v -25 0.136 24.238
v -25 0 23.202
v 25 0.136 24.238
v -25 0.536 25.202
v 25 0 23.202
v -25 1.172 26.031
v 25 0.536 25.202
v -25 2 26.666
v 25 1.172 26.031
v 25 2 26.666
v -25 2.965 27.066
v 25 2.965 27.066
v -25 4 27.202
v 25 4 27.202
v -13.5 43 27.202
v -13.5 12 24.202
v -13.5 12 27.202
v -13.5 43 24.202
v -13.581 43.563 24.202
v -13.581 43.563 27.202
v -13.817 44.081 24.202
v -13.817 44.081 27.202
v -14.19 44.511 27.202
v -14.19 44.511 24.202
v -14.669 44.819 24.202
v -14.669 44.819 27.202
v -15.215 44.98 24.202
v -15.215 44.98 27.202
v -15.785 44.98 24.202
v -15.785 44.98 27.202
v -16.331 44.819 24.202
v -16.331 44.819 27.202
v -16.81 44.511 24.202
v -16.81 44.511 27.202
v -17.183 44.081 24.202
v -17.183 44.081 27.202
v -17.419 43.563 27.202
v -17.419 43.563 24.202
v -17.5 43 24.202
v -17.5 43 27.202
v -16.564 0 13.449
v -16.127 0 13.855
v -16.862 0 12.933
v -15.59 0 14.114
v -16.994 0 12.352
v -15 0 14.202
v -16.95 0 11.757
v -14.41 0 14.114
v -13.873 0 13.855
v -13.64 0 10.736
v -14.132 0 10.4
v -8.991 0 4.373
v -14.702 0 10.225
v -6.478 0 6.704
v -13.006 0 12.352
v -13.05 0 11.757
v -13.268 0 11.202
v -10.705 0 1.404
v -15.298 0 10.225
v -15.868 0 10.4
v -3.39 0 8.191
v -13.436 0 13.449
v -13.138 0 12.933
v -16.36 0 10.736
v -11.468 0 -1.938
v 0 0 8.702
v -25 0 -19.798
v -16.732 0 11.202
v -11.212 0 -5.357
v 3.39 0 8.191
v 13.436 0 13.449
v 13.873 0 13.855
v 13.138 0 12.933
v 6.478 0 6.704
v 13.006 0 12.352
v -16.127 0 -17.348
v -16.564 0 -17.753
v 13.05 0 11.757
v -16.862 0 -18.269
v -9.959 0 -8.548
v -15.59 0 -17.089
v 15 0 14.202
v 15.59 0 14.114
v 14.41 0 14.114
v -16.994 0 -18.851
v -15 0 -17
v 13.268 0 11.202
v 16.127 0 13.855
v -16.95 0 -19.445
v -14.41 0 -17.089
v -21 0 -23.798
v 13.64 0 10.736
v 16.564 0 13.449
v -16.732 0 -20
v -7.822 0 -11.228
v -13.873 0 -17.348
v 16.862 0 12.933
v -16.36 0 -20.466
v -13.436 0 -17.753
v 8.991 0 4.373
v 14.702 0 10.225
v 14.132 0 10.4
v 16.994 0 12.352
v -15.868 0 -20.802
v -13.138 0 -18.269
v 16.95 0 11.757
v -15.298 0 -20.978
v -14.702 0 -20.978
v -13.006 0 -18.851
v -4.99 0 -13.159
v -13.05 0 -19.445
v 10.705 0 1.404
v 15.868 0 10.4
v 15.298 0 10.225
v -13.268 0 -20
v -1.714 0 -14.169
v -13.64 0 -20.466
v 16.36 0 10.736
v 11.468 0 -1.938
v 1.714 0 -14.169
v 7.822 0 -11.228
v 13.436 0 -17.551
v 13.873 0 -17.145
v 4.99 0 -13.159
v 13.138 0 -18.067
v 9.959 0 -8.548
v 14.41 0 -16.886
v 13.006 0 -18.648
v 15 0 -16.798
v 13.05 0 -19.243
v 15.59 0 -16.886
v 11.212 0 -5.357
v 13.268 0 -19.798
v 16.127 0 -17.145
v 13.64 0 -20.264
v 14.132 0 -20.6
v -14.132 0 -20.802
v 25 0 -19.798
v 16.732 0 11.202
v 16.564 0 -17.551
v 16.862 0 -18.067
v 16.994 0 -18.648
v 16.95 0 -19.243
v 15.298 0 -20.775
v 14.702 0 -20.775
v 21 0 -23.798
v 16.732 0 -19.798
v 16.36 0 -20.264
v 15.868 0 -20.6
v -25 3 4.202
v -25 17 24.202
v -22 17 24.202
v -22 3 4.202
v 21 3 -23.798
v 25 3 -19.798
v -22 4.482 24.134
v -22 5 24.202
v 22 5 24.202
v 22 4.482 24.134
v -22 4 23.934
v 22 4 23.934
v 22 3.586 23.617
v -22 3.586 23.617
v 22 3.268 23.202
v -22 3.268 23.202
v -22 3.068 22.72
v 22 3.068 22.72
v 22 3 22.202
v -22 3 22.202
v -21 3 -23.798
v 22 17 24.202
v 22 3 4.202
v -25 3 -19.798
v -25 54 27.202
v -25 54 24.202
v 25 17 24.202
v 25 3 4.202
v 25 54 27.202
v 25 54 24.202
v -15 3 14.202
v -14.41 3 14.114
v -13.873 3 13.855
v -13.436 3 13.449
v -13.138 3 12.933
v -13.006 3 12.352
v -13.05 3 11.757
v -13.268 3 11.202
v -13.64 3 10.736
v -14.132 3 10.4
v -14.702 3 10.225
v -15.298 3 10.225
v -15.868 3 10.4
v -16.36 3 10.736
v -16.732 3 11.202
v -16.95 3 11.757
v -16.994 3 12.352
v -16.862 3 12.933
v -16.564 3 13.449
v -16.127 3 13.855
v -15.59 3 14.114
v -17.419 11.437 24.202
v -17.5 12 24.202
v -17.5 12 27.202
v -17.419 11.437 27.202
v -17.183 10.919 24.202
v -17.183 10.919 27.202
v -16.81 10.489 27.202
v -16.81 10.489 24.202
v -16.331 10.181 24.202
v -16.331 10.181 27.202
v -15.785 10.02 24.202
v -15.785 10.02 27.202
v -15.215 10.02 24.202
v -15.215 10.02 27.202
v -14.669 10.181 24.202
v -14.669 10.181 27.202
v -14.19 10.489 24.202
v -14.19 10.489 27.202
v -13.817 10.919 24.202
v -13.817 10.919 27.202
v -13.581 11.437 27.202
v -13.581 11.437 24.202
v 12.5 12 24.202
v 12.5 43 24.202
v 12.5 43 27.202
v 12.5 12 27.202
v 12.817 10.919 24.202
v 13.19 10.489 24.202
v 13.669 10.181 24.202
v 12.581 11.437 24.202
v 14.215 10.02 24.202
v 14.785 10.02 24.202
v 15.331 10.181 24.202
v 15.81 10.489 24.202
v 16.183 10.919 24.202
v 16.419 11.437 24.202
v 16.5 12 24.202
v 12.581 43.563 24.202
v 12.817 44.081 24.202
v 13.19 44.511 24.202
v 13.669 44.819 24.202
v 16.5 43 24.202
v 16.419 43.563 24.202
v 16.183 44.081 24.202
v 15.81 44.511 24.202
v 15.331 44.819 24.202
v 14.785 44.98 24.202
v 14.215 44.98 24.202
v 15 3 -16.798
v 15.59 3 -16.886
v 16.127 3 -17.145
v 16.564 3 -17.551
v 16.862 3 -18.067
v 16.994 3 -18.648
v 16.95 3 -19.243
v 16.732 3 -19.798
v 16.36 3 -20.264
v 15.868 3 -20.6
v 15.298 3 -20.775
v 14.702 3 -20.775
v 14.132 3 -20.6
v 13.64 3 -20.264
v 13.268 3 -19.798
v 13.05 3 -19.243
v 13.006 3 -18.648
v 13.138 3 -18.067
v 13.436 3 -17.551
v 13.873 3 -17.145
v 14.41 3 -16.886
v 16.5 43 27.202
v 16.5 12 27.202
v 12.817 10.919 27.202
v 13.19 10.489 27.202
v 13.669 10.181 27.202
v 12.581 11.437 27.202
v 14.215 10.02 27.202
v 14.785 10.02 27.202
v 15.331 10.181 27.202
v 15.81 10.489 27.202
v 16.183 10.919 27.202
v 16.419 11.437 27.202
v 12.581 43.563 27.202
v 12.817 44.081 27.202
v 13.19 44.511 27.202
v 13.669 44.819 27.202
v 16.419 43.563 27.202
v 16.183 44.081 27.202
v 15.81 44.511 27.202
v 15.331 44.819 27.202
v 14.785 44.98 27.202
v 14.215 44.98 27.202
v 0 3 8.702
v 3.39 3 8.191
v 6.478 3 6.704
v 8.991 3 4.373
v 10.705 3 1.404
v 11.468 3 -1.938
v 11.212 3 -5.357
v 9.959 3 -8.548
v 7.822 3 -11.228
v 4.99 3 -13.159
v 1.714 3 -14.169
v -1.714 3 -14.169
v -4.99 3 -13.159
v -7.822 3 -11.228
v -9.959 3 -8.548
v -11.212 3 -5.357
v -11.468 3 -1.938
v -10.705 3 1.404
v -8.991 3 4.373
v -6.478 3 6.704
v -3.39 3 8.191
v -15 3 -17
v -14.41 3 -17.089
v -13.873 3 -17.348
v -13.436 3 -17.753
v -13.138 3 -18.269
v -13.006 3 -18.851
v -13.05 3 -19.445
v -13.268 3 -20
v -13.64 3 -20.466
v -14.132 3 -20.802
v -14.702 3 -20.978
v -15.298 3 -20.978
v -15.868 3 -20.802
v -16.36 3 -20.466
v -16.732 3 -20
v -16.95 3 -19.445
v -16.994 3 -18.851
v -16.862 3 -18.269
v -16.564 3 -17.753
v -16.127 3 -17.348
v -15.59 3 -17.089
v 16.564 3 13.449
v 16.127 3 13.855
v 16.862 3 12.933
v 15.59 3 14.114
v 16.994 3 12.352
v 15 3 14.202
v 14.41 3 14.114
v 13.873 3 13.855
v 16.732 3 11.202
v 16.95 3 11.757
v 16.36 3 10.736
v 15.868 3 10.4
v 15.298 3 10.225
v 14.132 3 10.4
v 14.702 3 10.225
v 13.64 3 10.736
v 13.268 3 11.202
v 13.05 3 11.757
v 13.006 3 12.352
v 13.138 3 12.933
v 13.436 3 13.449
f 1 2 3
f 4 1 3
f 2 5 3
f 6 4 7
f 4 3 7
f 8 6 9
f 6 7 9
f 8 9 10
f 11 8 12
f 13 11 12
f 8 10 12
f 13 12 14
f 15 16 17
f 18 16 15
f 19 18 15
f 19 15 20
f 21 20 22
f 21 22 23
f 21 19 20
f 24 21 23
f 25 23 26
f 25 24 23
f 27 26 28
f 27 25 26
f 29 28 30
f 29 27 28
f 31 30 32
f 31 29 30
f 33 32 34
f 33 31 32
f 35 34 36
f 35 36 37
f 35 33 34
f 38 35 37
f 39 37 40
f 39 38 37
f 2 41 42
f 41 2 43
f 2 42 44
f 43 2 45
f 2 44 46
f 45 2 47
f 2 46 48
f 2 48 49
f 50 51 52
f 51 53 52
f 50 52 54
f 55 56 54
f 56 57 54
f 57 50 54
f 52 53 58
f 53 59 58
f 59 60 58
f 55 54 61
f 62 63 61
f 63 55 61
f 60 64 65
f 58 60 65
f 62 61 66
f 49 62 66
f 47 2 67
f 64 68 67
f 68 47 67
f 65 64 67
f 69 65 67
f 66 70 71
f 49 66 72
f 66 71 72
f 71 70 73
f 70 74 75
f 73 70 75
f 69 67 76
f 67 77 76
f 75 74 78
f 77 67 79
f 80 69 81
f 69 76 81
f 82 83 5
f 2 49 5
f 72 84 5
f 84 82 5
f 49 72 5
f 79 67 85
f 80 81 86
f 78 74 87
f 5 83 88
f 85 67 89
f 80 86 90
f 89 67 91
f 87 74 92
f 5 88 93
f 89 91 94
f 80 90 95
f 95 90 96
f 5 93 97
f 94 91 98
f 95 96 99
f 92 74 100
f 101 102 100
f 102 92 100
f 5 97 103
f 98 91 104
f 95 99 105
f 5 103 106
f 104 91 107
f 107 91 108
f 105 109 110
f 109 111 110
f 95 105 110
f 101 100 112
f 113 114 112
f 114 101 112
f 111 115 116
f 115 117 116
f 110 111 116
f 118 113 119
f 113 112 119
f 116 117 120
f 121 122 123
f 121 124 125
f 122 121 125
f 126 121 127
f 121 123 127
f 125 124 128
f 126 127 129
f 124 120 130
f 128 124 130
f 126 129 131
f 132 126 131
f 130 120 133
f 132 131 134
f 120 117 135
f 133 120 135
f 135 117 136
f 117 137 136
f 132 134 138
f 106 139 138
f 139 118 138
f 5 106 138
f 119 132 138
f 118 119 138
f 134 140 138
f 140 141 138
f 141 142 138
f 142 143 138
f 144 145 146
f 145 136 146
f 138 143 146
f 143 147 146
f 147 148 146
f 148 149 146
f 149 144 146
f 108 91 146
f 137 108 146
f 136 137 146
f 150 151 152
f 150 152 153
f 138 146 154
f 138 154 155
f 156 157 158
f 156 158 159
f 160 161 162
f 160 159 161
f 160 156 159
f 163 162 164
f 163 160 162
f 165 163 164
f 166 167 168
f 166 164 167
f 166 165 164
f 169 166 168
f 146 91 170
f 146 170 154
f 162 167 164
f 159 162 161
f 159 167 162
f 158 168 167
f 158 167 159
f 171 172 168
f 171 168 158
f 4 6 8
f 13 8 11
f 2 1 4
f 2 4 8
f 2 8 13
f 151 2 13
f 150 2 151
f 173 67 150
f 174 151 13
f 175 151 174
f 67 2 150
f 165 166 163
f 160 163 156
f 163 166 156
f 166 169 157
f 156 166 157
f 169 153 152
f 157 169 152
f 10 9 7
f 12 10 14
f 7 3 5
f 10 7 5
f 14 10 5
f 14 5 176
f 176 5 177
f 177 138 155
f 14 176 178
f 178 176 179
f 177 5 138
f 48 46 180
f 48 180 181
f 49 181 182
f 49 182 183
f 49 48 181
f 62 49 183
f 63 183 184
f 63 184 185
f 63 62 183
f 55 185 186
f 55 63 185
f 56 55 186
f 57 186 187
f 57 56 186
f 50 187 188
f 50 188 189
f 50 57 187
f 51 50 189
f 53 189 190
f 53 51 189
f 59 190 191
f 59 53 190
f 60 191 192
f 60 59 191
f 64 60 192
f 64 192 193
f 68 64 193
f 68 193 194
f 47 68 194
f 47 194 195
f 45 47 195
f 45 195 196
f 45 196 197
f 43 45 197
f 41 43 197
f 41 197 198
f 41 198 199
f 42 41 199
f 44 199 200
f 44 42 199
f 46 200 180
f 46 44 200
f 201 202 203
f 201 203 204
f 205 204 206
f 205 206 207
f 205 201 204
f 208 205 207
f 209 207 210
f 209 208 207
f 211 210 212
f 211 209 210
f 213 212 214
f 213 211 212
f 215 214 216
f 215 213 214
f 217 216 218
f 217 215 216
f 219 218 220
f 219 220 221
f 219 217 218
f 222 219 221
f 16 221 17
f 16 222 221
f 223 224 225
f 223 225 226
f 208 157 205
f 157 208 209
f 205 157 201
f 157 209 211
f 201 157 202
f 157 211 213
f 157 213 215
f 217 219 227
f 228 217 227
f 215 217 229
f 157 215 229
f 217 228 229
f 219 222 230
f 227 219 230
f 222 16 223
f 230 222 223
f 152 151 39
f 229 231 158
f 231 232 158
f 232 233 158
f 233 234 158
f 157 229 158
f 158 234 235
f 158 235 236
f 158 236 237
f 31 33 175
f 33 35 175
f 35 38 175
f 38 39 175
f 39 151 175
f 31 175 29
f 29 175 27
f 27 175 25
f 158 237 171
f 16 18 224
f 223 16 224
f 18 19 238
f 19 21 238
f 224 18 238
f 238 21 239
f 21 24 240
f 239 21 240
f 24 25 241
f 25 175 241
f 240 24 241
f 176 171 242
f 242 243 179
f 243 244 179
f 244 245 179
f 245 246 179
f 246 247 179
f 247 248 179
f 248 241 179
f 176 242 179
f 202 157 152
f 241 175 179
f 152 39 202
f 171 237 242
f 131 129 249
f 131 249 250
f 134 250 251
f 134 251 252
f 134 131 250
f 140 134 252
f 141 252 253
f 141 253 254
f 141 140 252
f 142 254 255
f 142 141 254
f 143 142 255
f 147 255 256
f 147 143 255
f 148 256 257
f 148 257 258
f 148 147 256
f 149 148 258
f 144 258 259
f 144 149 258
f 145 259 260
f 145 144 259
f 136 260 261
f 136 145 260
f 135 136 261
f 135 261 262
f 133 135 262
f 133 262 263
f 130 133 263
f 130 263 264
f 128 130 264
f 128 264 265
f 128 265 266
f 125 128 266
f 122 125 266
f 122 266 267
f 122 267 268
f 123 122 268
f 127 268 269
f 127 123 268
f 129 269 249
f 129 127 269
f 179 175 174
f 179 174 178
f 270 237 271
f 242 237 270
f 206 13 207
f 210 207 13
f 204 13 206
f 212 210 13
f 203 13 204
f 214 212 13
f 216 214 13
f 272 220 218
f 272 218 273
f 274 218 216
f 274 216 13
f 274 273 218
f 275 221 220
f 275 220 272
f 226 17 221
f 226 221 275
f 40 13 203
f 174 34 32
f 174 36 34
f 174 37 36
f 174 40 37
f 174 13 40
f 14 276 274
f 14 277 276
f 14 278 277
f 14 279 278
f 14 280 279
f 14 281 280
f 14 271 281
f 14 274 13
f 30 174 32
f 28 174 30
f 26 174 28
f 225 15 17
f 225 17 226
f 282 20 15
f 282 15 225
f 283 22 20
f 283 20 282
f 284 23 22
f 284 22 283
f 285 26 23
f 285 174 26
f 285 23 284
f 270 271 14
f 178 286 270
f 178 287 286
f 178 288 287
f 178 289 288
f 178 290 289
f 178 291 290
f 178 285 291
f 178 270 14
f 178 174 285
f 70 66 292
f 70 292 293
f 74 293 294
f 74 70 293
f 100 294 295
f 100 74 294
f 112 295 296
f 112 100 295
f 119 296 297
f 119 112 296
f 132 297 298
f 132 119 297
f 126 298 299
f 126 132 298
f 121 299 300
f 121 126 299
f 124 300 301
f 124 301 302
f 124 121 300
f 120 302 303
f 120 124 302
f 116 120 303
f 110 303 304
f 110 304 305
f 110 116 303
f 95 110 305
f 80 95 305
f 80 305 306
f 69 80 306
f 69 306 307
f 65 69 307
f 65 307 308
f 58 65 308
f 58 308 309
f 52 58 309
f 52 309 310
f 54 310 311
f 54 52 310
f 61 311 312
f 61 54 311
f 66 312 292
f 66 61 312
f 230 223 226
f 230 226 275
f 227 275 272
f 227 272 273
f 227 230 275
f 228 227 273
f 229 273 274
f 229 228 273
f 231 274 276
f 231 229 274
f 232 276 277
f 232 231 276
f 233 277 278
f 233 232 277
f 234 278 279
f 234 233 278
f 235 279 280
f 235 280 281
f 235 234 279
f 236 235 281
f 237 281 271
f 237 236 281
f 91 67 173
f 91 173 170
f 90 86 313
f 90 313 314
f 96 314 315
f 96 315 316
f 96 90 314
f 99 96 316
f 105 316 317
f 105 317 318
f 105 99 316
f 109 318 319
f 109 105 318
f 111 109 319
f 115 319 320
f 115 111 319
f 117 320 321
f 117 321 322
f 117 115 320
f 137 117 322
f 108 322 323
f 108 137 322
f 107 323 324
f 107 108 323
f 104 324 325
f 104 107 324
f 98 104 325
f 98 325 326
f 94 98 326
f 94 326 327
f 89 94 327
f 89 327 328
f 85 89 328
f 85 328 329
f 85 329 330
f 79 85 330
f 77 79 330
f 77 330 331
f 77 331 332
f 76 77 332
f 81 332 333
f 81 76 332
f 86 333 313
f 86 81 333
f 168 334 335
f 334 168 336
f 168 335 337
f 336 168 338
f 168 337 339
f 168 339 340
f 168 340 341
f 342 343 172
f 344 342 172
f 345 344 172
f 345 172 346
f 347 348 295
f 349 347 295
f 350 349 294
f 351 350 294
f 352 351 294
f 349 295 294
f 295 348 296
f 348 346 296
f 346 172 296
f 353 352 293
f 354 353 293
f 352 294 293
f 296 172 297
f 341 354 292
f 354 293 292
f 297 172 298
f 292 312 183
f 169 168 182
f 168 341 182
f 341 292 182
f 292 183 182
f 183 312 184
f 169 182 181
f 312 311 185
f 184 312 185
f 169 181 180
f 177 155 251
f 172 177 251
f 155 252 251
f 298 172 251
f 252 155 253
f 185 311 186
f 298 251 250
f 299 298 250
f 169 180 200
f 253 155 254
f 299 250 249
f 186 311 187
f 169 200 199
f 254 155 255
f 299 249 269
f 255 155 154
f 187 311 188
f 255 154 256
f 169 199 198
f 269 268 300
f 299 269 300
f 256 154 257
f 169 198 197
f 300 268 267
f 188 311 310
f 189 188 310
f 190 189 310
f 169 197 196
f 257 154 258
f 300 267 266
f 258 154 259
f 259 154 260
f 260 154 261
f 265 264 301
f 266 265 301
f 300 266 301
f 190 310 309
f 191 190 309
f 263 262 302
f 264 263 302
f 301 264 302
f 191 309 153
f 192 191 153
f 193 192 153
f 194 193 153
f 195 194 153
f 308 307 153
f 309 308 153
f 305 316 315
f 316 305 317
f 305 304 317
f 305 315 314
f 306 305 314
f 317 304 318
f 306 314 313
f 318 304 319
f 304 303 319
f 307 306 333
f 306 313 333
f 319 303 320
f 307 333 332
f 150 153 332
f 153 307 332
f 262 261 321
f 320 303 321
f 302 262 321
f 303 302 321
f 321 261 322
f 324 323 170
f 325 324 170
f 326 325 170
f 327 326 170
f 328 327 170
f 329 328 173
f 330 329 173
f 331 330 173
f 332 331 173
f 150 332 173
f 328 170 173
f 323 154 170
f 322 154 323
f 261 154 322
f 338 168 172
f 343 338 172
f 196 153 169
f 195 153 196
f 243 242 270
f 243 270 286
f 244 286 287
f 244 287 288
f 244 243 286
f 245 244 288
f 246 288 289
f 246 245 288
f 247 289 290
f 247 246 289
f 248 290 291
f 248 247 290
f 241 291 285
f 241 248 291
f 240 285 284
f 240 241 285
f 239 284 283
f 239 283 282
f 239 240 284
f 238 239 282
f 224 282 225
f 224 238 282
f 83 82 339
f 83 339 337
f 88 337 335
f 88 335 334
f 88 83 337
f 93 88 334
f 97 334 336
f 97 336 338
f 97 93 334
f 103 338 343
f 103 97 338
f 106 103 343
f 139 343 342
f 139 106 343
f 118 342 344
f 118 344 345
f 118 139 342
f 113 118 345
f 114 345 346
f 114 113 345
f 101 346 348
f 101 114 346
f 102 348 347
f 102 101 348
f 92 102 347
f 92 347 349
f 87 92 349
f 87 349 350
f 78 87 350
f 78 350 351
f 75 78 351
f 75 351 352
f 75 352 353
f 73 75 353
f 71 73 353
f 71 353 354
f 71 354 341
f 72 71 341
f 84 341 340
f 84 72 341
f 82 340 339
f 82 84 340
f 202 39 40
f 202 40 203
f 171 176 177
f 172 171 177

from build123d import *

# Parameters (mm, degrees)
SKETCH1_R           = 11.5
SKETCH1_R_2         = 2
BOSS_EXTRUDE1_DEPTH = 3
SKETCH2_W           = 50
SKETCH2_H           = 54
BOSS_EXTRUDE2_DEPTH = 3
FILLET1_R           = 4
FILLET2_R           = 2
BOSS_EXTRUDE3_DEPTH = 3


with BuildPart() as part:
    # Sketch1 → Boss-Extrude1 (new body)
    with BuildSketch(Plane(origin=(0, 0, 0), x_dir=(1, 0, 0), z_dir=(0, 1, 0))):
        Polygon((21, 23.797619048), (25, 19.797619048), (25, -24.202380952), (-25, -24.202380952), (-25, 19.797619048), (-21, 23.797619048), align=None)
        with Locations(Location((0, 2.797619048, 0), (0, 0, 270))):
            Circle(SKETCH1_R, mode=Mode.SUBTRACT)
        with Locations(Location((-15, 19, 0), (0, 0, 270))):
            Circle(SKETCH1_R_2, mode=Mode.SUBTRACT)
        with Locations(Location((15, 18.797619048, 0), (0, 0, 270))):
            Circle(SKETCH1_R_2, mode=Mode.SUBTRACT)
        with Locations(Location((15, -12.202380952, 0), (0, 0, 270))):
            Circle(SKETCH1_R_2, mode=Mode.SUBTRACT)
        with Locations(Location((-15, -12.202380952, 0), (0, 0, 270))):
            Circle(SKETCH1_R_2, mode=Mode.SUBTRACT)
    extrude(amount=BOSS_EXTRUDE1_DEPTH)

    # Sketch2 → Boss-Extrude2 (add)
    with BuildSketch(Plane.XY.offset(24.202380952)):
        with Locations((0, 27)):
            Rectangle(SKETCH2_W, SKETCH2_H)
        with BuildLine():
            Line((-17.5, 43), (-17.5, 12))
            ThreePointArc((-17.5, 12), (-15.5, 10), (-13.5, 12))
            Line((-13.5, 12), (-13.5, 43))
            ThreePointArc((-13.5, 43), (-15.5, 45), (-17.5, 43))
        make_face(mode=Mode.SUBTRACT)
        with BuildLine():
            Line((12.5, 43), (12.5, 12))
            ThreePointArc((12.5, 12), (14.5, 10), (16.5, 12))
            Line((16.5, 12), (16.5, 43))
            ThreePointArc((16.5, 43), (14.5, 45), (12.5, 43))
        make_face(mode=Mode.SUBTRACT)
    extrude(amount=BOSS_EXTRUDE2_DEPTH)

    # Fillet1
    fillet1_edges = [part.edges().sort_by_distance(p)[0] for p in [
        (0, 0, 27.202380952),
    ]]
    fillet(fillet1_edges, radius=FILLET1_R)

    # Fillet2
    fillet2_edges = [part.edges().sort_by_distance(p)[0] for p in [
        (0, 3, 24.202380952),
    ]]
    fillet(fillet2_edges, radius=FILLET2_R)

    # Sketch6 → Boss-Extrude3 (add)
    with BuildSketch(Plane(origin=(25, 0, 0), x_dir=(0, 0, -1), z_dir=(1, 0, 0))):
        Polygon((-24.202380952, 3), (-24.202380952, 17), (-4.202380952, 3), align=None)
    boss_extrude3 = extrude(amount=-BOSS_EXTRUDE3_DEPTH)

    # Mirror1: Boss-Extrude3 across plane
    add(boss_extrude3.mirror(Plane(origin=(0, 0, 0), x_dir=(0, 0, 1), z_dir=(1, 0, 0))))


solid = part.part
